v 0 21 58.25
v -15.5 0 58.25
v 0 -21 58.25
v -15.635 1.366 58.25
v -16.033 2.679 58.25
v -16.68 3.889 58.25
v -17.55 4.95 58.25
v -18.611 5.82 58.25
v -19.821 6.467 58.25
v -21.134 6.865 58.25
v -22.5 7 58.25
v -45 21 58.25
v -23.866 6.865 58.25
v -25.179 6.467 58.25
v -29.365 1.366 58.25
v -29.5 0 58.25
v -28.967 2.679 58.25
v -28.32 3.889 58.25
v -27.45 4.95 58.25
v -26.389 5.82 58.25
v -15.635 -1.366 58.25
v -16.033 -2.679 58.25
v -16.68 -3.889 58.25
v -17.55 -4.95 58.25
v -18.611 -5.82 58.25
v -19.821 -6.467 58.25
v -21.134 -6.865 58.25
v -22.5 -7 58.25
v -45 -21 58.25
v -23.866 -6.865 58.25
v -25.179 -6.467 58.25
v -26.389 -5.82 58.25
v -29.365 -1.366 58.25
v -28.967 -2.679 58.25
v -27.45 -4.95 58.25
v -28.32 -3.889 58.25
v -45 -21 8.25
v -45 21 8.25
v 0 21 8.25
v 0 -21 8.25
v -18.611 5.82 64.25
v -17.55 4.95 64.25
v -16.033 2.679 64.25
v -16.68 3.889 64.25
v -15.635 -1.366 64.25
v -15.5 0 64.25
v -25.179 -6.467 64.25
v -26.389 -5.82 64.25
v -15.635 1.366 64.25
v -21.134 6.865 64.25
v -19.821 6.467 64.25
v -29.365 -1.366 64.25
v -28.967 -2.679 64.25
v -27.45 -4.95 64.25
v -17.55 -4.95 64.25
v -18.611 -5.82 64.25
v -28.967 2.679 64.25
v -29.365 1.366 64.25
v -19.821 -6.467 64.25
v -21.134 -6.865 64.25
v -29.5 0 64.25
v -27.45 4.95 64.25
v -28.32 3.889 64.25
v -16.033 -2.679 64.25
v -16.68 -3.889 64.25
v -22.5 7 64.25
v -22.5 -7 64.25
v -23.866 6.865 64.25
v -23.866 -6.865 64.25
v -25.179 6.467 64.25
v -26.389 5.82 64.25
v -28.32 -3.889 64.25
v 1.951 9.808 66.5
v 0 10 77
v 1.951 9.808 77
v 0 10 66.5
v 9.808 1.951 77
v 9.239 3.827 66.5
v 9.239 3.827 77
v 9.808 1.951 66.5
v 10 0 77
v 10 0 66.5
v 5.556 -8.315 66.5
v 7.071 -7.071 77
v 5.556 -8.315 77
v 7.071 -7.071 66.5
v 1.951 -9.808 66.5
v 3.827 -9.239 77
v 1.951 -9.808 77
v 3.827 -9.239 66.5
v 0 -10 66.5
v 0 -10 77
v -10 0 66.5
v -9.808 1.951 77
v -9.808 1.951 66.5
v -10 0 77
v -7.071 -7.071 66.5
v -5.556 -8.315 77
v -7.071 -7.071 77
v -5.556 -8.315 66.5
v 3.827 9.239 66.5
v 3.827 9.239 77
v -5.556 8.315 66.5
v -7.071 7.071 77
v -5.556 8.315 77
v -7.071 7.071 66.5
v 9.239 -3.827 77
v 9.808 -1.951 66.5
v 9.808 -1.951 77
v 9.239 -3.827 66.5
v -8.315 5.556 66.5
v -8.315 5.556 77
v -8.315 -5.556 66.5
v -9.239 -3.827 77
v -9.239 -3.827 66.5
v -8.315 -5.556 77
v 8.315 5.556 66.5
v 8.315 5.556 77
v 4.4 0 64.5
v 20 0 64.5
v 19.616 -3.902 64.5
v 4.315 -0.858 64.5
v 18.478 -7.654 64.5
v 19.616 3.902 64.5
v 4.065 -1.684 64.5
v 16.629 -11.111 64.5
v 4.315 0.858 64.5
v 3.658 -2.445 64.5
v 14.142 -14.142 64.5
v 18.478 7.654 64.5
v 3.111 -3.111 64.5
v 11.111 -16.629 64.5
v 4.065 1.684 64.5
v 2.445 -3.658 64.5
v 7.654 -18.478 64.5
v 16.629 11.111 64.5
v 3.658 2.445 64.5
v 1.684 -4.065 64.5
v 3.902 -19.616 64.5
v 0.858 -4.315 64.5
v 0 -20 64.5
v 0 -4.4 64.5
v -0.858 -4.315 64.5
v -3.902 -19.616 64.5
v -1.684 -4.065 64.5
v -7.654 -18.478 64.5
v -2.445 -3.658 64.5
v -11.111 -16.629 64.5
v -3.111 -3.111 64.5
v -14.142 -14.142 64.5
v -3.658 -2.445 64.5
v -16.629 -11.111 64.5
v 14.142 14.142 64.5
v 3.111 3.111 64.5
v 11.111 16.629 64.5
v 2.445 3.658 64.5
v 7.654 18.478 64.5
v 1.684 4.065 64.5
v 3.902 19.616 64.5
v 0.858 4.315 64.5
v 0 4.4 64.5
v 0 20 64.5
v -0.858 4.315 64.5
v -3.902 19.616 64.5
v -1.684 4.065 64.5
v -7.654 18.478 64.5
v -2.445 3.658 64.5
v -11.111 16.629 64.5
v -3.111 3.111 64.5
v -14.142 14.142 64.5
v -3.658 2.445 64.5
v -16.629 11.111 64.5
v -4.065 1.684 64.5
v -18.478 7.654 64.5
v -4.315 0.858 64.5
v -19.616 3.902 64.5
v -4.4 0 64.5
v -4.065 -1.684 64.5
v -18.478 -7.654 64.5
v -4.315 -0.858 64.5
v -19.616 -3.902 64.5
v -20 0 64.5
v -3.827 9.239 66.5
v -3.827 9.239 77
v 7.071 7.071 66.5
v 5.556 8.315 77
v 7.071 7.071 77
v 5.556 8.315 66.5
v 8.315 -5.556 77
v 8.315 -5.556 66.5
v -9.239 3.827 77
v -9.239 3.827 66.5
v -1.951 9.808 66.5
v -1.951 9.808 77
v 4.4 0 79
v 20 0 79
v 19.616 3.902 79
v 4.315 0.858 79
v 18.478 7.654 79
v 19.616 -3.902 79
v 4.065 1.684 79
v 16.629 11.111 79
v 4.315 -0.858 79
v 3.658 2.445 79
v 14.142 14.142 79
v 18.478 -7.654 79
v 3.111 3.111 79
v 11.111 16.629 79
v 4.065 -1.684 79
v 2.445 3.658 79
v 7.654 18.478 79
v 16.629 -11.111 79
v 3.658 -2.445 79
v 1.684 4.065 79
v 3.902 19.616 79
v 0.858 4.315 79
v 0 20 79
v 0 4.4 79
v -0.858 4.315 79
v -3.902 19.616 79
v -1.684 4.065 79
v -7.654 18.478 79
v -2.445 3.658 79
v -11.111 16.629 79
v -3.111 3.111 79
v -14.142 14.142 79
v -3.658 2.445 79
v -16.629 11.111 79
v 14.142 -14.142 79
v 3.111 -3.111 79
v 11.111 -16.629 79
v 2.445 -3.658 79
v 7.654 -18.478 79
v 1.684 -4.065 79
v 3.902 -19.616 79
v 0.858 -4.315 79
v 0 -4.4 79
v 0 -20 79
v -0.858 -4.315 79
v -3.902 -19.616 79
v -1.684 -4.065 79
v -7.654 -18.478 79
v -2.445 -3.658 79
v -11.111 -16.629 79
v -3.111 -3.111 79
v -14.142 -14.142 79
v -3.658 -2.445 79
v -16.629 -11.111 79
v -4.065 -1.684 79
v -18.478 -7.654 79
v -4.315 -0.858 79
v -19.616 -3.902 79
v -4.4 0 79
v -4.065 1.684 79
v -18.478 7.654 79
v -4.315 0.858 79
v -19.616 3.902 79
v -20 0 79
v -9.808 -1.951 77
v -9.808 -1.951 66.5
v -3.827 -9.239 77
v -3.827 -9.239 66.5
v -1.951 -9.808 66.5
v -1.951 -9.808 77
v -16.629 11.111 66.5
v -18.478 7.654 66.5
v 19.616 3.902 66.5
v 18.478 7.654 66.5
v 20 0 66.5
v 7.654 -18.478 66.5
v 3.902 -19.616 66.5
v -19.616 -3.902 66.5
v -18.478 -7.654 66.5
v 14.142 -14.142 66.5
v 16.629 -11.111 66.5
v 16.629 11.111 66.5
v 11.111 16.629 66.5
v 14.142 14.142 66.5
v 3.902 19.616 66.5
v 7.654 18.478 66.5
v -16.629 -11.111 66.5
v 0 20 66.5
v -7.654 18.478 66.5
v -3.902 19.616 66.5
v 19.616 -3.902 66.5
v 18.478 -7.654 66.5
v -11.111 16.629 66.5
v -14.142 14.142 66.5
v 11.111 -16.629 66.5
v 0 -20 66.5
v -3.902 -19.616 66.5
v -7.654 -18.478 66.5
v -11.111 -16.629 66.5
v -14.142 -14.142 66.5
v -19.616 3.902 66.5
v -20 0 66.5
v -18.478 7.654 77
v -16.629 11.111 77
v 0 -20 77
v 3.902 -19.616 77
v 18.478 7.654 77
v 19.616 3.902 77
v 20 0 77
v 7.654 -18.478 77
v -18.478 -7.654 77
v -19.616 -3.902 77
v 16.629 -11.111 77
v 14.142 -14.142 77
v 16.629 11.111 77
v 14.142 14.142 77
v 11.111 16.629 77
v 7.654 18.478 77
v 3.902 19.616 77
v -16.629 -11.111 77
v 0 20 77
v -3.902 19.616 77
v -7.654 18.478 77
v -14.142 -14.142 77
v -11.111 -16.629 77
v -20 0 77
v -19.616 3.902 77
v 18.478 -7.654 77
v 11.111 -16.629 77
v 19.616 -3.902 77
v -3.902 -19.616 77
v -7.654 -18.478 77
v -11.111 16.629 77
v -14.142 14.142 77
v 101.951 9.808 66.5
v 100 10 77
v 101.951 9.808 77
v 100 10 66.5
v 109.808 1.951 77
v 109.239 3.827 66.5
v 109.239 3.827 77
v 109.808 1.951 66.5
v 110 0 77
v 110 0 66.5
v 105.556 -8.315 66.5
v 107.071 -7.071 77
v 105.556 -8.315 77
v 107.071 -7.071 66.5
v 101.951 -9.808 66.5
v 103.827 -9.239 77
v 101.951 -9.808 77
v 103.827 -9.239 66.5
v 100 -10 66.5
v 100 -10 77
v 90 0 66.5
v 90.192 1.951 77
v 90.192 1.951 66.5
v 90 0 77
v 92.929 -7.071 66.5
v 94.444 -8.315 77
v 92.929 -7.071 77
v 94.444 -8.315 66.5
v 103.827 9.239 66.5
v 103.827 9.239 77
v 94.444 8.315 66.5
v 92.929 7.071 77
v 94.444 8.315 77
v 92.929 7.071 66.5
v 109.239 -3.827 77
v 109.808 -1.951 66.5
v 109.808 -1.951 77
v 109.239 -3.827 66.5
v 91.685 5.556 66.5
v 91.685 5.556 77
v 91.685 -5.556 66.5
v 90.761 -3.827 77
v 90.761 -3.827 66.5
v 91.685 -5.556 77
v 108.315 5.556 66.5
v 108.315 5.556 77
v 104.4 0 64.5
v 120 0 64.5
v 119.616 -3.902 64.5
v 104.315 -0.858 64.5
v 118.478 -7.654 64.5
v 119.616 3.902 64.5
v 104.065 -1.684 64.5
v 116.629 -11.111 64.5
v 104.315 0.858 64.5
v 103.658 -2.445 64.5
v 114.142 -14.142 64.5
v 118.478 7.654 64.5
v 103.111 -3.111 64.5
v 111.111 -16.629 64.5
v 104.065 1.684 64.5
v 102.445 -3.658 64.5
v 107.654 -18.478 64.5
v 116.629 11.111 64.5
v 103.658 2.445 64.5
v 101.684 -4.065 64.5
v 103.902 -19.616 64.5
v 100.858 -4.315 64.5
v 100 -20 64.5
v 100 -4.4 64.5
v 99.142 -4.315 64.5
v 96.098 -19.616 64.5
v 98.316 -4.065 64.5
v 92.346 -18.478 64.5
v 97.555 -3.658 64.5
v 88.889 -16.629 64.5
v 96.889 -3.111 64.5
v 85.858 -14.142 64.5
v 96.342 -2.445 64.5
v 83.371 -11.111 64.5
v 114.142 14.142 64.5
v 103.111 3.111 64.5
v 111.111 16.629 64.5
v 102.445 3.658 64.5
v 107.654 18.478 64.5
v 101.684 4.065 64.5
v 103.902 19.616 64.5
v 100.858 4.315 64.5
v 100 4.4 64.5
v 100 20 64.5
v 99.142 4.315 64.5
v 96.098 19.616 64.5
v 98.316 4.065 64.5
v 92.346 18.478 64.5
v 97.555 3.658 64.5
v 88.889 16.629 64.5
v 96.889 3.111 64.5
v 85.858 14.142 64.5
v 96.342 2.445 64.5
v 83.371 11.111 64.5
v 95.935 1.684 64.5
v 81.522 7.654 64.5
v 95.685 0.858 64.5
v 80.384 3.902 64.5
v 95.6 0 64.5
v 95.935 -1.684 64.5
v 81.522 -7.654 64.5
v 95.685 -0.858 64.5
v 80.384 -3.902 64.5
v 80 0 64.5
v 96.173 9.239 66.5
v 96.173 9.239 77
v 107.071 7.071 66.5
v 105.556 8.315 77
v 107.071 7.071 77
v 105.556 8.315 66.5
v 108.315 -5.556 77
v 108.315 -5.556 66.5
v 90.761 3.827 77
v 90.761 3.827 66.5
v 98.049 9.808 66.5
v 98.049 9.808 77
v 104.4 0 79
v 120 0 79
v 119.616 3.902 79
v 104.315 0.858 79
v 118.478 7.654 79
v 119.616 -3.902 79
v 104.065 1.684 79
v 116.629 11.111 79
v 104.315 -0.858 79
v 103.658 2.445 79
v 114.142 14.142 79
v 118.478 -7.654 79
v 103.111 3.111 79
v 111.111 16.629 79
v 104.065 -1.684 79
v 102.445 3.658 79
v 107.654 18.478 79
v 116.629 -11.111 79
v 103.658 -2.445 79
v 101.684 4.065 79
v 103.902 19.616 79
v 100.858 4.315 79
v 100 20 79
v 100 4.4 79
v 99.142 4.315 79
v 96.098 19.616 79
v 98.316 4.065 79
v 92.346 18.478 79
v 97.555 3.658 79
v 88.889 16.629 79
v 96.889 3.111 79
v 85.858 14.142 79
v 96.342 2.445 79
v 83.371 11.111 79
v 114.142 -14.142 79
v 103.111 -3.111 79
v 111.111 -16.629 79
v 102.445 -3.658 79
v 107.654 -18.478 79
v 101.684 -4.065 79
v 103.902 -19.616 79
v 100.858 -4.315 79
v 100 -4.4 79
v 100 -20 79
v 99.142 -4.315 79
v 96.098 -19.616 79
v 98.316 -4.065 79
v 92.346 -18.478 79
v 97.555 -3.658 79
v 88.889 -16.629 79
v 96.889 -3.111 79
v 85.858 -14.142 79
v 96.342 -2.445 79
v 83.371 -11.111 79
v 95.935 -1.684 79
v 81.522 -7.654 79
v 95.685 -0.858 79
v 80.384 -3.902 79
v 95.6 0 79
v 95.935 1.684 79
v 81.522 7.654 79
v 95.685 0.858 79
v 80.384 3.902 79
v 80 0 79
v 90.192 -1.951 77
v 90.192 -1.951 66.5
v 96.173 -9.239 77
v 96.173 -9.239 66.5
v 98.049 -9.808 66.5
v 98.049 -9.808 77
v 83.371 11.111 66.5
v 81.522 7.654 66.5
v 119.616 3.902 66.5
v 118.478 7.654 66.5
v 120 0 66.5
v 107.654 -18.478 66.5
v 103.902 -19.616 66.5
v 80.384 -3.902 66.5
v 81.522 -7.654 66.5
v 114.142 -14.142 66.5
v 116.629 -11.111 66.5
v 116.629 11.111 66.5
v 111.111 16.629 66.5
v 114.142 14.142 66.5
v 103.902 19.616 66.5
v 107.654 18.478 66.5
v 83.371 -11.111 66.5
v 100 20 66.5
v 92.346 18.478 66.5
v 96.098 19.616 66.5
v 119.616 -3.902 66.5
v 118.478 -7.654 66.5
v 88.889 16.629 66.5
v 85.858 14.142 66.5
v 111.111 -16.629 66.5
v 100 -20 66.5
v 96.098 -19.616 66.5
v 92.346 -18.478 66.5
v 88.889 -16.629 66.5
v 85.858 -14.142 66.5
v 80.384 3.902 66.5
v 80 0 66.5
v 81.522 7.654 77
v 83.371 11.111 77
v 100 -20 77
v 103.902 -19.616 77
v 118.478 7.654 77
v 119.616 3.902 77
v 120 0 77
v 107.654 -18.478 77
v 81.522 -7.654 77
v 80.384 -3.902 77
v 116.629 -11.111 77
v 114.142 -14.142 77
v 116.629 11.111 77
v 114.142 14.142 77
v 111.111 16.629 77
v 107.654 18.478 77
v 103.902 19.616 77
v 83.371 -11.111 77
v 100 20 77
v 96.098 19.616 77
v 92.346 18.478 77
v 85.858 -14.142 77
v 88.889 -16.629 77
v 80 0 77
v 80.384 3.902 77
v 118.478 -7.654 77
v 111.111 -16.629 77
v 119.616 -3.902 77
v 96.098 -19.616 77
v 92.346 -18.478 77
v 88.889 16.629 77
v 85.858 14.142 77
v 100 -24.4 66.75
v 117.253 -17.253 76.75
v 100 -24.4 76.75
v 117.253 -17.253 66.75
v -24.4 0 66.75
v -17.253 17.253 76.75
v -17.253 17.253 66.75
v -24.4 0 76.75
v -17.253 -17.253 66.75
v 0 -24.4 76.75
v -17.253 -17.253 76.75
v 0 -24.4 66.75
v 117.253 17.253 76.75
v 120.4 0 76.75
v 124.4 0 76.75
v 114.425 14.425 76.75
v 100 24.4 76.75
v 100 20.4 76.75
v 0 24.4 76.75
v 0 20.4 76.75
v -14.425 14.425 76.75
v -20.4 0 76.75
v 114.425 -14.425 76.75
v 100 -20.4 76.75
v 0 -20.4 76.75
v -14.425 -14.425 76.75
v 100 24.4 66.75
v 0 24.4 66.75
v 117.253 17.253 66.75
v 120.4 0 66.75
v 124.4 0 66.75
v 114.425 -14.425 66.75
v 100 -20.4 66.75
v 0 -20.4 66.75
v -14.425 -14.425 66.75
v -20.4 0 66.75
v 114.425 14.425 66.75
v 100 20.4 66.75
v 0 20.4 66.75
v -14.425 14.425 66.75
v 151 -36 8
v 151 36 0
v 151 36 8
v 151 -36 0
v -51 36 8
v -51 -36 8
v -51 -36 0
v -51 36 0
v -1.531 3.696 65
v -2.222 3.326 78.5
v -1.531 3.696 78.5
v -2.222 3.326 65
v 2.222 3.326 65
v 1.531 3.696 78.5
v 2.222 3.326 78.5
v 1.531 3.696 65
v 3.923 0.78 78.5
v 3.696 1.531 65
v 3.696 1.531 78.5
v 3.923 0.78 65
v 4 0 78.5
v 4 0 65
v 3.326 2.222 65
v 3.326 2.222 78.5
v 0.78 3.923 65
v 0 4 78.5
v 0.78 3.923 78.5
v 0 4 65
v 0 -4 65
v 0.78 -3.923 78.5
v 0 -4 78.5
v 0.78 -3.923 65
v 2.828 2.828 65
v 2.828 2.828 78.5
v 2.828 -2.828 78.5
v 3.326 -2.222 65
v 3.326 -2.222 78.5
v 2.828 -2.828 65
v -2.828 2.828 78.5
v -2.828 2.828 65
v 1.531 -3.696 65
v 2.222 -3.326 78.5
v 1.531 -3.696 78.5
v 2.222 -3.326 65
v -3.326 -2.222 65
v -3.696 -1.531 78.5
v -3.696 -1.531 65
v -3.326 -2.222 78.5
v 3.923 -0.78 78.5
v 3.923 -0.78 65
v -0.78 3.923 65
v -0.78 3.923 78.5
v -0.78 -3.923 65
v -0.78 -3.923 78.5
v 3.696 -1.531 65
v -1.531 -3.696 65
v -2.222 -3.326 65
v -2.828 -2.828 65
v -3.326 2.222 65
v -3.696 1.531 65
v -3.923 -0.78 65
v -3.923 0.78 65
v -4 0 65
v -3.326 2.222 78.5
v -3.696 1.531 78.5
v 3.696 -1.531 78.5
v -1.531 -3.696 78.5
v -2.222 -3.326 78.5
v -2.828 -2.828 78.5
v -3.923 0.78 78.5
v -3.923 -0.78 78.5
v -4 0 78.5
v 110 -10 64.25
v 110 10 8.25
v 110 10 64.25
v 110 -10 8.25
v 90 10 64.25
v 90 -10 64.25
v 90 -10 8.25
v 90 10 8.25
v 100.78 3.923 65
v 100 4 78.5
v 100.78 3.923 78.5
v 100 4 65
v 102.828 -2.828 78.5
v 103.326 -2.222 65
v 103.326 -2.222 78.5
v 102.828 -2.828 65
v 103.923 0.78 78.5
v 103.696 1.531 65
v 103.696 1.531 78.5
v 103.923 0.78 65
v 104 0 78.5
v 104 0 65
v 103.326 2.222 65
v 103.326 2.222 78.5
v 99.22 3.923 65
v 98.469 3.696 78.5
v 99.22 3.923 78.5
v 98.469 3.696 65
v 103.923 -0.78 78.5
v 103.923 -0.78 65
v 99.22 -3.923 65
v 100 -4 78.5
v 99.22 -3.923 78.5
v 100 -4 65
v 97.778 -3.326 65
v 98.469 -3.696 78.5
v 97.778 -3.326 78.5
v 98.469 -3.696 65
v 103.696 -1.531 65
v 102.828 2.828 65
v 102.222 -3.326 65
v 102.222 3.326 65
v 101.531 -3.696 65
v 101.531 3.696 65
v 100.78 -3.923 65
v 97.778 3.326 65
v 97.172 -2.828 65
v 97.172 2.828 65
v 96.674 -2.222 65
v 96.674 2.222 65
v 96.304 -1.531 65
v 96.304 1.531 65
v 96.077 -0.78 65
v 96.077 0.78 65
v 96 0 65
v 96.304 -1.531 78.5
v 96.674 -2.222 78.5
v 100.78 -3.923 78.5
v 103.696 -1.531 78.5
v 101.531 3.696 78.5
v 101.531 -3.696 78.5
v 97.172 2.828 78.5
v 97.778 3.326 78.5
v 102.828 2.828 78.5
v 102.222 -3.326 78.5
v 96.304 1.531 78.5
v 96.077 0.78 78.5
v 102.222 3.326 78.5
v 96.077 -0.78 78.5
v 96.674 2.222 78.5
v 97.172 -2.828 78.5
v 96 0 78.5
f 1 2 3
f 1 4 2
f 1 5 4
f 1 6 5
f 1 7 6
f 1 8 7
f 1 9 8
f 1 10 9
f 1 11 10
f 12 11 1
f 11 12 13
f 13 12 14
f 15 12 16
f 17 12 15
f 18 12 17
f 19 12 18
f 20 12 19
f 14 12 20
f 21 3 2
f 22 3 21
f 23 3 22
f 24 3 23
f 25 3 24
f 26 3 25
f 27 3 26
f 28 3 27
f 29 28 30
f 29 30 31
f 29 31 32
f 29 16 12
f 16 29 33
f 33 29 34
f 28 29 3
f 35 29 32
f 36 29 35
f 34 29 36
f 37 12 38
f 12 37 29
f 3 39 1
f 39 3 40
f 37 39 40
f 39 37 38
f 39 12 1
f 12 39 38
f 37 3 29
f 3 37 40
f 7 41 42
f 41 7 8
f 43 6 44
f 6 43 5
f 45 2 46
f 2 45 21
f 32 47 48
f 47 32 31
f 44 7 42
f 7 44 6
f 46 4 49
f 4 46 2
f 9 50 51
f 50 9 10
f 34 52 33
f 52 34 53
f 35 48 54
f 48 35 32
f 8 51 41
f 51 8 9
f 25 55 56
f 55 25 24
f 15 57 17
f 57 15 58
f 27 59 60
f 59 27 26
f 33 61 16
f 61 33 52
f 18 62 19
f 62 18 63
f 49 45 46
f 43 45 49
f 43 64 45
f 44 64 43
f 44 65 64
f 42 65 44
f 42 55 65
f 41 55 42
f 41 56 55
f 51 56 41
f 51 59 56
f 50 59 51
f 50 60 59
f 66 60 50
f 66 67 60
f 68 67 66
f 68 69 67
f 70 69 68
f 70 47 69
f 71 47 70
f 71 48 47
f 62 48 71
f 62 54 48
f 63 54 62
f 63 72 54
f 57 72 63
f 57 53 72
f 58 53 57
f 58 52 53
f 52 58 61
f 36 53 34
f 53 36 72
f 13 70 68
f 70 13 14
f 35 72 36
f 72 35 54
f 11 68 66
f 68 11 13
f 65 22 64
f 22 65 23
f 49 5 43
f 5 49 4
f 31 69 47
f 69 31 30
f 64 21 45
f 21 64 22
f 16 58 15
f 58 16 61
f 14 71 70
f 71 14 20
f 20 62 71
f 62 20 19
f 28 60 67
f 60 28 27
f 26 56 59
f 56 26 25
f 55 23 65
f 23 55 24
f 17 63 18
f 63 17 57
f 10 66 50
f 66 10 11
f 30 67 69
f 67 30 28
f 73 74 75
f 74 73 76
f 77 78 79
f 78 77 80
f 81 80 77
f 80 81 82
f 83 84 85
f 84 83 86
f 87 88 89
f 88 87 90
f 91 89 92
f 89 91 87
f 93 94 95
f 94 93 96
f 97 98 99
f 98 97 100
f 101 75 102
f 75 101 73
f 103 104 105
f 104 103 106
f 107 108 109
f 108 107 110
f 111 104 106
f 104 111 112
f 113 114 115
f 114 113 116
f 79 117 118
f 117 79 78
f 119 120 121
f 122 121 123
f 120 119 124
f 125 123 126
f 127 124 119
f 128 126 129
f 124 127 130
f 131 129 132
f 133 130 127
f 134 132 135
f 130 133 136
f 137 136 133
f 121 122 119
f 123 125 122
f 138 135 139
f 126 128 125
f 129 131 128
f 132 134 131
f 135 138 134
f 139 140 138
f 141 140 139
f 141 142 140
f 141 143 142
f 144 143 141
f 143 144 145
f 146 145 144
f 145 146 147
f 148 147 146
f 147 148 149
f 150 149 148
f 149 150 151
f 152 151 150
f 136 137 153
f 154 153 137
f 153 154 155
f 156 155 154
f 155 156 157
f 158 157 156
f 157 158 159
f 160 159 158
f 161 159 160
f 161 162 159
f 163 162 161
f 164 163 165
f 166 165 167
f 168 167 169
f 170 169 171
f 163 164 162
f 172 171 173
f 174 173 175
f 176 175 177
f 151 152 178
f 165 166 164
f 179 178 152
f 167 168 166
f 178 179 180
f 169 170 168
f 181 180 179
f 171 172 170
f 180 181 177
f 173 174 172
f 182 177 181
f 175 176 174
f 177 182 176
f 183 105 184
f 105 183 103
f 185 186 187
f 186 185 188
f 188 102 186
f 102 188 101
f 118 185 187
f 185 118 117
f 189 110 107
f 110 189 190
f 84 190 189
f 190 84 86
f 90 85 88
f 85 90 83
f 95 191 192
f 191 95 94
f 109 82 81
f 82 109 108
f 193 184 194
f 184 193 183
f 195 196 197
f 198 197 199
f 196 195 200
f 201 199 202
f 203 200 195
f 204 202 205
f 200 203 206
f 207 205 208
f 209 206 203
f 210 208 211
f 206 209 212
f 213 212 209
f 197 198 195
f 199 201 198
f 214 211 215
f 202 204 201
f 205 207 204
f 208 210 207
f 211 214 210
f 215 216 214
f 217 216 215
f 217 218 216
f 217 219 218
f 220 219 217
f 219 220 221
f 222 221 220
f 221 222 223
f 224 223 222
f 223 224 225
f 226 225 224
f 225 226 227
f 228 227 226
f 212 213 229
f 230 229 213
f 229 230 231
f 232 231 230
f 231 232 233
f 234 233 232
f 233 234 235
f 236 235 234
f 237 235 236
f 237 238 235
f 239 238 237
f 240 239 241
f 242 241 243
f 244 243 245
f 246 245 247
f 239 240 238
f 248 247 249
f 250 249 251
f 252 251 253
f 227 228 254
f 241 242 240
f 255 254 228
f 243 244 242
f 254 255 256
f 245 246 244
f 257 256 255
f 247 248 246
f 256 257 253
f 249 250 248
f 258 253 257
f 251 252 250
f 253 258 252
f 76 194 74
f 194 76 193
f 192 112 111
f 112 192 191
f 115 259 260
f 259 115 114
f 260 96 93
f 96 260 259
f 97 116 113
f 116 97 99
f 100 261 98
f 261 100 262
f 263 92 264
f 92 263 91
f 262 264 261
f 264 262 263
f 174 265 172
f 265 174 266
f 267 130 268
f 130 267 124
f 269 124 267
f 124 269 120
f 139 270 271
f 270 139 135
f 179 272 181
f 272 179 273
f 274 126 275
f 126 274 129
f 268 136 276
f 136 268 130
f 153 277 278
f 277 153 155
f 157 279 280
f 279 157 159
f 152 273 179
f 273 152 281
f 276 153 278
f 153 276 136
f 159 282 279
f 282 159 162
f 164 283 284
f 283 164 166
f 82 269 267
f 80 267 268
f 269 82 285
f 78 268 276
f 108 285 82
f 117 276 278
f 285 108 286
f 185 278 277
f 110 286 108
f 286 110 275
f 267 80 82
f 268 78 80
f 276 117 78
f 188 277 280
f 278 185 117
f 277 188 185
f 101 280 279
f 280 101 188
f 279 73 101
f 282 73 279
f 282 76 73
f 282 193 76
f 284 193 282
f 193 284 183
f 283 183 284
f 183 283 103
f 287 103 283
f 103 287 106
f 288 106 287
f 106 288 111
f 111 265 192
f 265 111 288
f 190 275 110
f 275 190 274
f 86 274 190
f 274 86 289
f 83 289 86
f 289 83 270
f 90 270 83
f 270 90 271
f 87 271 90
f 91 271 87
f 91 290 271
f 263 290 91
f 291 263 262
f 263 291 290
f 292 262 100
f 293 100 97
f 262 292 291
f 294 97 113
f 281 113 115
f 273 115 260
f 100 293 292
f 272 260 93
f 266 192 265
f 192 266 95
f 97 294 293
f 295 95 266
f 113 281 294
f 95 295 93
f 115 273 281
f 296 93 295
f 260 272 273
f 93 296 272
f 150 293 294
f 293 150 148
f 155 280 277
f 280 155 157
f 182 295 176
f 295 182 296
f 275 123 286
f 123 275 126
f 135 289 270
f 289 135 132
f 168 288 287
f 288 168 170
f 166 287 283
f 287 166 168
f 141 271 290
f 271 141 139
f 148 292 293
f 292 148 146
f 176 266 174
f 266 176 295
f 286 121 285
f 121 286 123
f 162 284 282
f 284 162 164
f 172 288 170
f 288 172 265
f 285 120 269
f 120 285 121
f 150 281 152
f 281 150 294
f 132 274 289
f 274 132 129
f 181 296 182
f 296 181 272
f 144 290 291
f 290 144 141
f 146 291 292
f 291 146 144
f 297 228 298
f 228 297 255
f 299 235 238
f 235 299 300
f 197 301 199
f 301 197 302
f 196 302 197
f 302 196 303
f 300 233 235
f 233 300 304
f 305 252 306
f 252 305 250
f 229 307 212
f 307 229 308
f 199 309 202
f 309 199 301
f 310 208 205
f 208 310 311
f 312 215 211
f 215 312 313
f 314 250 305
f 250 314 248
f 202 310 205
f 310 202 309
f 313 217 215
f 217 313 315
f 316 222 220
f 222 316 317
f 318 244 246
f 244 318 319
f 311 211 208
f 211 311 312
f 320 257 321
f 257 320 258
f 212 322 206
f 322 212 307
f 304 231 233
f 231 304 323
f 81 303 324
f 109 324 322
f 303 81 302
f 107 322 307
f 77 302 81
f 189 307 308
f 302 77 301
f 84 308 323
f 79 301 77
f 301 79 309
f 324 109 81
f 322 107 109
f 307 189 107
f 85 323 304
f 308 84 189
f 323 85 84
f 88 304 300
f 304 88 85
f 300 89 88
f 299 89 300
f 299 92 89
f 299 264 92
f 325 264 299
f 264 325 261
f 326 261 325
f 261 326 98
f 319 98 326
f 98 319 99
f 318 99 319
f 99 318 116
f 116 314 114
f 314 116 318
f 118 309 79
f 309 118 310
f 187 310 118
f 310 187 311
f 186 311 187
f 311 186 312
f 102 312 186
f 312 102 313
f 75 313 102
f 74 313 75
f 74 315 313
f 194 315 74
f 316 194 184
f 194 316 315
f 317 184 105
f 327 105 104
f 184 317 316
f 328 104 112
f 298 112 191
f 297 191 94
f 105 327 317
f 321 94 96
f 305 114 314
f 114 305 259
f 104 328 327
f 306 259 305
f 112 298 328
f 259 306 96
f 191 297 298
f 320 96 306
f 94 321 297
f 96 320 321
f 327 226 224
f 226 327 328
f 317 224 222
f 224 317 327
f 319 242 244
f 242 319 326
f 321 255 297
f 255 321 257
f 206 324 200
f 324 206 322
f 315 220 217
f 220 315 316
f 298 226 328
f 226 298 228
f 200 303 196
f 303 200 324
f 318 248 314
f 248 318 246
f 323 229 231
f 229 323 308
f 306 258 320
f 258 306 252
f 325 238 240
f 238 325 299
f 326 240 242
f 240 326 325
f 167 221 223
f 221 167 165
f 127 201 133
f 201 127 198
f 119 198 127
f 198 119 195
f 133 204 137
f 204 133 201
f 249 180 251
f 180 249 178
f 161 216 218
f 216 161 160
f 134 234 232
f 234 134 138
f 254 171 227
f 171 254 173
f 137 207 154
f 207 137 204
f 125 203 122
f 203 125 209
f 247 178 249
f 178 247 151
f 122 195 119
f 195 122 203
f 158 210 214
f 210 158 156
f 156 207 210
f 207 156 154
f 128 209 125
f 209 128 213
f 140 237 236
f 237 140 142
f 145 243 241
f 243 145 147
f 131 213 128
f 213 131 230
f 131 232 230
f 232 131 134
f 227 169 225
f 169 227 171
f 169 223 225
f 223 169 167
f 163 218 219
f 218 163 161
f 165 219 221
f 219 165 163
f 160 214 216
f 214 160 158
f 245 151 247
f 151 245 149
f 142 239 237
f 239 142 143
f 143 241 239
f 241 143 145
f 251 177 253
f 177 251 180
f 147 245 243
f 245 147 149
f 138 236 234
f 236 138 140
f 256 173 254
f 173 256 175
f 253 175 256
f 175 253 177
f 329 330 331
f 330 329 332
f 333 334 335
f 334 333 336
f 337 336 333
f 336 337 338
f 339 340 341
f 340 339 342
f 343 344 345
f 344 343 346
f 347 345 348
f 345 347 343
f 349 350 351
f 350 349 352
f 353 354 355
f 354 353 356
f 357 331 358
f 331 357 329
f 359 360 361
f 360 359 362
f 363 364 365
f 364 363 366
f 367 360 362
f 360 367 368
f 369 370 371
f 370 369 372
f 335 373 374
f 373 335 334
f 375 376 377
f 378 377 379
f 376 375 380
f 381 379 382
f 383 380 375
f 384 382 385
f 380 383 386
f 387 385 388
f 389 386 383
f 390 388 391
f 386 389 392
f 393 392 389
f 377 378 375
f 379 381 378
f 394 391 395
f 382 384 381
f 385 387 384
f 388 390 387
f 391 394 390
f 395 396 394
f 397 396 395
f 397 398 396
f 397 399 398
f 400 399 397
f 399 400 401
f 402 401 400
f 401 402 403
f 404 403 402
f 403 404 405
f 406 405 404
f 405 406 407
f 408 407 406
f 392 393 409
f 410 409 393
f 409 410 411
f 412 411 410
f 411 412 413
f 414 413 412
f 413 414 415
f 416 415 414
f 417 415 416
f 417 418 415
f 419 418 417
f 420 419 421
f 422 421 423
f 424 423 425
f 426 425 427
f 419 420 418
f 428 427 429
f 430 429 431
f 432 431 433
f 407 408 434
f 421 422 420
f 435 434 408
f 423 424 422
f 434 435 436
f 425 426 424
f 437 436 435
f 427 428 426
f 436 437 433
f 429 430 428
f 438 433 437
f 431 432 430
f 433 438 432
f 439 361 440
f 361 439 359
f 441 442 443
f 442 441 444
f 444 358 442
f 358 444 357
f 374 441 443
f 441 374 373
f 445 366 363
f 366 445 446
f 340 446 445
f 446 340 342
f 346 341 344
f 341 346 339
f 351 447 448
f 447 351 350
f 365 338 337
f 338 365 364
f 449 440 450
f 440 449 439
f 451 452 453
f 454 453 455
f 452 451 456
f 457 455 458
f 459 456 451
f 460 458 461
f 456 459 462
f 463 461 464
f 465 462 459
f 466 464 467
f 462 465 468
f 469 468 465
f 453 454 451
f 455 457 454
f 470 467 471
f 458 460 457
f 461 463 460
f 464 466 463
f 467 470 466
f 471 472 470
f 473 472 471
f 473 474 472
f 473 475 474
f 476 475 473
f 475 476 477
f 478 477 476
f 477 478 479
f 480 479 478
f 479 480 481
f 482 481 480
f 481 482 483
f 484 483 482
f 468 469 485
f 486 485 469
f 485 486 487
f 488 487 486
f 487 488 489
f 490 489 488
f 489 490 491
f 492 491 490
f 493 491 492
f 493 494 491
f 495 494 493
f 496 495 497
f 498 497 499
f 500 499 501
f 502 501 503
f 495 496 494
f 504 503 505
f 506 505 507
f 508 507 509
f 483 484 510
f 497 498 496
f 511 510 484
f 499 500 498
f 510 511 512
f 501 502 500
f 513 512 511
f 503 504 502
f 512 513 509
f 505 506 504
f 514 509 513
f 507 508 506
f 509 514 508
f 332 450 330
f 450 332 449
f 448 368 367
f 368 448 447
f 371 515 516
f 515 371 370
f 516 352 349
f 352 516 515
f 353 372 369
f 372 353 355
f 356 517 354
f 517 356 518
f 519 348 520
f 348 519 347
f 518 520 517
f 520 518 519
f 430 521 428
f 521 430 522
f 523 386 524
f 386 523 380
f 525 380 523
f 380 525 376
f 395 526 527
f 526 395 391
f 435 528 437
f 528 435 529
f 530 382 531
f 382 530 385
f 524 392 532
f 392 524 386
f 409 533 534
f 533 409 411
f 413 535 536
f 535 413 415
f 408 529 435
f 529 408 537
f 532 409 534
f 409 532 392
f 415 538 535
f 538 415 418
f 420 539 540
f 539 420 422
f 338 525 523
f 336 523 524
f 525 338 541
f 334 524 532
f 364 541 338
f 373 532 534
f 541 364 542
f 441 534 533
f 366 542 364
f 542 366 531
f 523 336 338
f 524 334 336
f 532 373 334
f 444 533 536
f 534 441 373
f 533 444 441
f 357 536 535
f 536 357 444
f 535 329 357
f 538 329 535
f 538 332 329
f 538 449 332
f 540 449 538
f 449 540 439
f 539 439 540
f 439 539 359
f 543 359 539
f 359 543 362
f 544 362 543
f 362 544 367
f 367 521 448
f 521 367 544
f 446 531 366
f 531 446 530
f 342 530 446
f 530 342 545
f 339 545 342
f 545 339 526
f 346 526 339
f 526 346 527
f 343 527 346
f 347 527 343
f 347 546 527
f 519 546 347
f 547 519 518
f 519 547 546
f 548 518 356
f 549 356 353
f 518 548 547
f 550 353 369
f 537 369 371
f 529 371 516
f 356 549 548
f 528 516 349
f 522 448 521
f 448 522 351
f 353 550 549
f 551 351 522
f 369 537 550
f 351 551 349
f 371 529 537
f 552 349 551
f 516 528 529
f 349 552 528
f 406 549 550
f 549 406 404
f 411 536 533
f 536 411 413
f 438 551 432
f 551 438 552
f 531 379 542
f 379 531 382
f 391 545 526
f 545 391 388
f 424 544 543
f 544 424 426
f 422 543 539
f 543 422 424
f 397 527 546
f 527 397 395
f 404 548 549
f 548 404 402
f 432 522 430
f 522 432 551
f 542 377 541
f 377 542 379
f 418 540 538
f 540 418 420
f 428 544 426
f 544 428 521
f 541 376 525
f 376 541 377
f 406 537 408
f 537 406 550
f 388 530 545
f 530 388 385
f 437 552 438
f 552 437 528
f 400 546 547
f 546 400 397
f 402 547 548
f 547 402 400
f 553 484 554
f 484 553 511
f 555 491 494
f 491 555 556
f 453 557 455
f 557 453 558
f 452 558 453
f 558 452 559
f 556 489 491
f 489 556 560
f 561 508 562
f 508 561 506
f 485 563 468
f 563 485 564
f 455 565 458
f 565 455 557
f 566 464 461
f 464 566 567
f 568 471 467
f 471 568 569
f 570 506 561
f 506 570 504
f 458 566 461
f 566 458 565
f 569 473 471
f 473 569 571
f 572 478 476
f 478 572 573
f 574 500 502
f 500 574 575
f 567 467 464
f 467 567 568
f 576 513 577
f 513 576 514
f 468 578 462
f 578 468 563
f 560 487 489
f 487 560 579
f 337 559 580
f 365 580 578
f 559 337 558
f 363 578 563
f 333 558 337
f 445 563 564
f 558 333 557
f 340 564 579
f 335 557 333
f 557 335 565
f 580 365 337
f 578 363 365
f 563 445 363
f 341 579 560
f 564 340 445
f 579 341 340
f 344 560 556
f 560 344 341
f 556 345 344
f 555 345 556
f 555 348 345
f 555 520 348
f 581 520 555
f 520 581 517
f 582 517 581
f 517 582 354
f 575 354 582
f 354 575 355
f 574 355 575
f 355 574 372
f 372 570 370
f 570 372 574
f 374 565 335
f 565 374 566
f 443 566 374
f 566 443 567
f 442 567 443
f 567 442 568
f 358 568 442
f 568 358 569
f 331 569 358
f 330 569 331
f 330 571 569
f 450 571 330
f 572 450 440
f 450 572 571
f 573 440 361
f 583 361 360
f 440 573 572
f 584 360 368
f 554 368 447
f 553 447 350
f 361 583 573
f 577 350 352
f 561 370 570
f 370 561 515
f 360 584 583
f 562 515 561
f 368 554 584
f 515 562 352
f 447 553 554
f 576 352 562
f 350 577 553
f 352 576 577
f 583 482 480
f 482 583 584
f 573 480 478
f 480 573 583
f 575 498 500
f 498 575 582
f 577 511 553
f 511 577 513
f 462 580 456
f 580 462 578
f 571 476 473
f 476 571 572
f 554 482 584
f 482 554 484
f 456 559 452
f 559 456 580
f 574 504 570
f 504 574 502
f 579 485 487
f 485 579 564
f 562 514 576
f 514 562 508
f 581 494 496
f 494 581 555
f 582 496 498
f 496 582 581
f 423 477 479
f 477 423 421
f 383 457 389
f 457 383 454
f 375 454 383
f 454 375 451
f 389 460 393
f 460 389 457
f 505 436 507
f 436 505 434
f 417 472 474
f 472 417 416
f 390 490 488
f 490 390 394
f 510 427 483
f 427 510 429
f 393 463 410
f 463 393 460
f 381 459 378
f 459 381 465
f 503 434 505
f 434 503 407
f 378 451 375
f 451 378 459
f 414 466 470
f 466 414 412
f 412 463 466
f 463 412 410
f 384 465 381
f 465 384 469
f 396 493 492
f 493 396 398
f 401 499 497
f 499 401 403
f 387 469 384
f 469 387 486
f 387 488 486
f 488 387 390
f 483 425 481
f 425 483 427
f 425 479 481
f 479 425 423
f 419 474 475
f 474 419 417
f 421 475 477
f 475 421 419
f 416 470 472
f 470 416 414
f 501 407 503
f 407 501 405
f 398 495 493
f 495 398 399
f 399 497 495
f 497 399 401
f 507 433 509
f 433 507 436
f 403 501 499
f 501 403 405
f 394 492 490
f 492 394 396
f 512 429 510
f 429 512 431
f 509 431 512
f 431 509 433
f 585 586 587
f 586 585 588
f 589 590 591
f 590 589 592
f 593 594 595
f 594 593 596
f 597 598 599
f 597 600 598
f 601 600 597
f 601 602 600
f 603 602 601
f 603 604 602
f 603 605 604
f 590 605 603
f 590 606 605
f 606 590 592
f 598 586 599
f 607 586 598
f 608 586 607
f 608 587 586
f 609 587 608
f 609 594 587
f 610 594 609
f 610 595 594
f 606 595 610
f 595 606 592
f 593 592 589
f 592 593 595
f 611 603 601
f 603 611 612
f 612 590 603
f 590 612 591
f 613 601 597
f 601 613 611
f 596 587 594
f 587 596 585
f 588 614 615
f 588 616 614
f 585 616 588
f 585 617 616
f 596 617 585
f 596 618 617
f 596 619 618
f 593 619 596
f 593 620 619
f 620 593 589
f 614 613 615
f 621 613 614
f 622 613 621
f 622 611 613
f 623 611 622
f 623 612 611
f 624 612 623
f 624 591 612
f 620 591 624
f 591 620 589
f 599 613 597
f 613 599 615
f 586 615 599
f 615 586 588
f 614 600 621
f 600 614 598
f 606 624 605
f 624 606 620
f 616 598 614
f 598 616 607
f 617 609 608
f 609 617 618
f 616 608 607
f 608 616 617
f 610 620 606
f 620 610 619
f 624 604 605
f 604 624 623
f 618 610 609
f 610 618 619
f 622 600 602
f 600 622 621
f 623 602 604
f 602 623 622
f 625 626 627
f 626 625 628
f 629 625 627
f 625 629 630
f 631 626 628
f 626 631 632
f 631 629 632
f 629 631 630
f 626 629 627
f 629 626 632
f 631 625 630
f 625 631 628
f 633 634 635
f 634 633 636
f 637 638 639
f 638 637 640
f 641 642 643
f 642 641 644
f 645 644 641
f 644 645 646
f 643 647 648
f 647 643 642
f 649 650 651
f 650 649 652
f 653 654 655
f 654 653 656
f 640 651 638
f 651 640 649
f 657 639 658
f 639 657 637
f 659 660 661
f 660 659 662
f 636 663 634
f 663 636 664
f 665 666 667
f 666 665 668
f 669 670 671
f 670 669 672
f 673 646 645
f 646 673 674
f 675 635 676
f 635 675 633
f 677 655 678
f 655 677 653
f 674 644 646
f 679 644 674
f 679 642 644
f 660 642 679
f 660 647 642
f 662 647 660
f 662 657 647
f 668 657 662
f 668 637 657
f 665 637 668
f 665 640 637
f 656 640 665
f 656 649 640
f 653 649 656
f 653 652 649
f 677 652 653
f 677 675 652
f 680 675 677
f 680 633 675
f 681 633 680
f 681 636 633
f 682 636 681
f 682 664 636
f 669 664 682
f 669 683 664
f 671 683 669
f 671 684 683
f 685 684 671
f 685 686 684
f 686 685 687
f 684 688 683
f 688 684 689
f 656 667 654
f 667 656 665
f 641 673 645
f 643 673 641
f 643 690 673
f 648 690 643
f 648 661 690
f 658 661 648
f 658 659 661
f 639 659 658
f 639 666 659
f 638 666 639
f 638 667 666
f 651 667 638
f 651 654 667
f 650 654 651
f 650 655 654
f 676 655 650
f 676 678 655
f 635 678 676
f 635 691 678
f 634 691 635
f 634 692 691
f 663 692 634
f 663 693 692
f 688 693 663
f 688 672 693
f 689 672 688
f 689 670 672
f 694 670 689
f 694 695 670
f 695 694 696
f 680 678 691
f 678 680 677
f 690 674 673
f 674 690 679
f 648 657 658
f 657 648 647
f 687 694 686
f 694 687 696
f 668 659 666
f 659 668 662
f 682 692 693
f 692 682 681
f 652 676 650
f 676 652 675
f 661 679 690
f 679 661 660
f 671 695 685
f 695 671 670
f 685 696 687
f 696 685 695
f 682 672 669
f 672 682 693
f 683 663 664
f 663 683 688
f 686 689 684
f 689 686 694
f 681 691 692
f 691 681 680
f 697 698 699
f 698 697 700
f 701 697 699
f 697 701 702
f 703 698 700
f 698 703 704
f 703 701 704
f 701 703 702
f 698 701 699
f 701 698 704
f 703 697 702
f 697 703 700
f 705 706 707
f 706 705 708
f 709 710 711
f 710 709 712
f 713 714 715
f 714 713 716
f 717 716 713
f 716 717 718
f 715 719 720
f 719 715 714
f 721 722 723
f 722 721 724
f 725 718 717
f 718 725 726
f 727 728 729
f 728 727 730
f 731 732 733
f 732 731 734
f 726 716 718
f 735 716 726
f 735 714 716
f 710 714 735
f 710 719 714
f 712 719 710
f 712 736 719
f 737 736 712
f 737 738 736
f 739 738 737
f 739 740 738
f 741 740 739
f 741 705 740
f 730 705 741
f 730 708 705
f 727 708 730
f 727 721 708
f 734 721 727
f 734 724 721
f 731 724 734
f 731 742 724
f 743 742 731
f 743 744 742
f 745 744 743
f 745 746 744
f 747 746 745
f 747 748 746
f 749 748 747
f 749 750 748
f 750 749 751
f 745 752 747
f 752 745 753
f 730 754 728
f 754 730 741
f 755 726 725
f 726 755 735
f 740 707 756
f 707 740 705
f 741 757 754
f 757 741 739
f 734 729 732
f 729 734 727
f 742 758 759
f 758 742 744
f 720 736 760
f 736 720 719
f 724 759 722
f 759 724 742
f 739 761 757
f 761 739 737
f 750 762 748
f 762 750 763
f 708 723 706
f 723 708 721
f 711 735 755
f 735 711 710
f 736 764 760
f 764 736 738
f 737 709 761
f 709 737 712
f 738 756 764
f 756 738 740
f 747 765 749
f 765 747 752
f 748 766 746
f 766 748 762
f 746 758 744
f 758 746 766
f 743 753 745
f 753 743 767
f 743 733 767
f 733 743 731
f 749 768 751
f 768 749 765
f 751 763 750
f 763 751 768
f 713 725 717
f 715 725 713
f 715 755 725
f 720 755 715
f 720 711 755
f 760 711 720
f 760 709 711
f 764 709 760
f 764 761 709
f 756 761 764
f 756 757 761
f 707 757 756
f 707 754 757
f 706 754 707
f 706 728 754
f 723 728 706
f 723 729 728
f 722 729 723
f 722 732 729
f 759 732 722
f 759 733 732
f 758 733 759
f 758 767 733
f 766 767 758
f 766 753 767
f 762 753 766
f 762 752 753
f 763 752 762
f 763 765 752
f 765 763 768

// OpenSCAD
$fn = 32;

// ------------------------------------------------------------------------
// Motor belt drive: span 100 mm, pulleys d40, belt 10 mm wide
// Every part is its own module, assembly() places every instance.
// ------------------------------------------------------------------------

// --- part 1 ---
module base_plate() {
  difference() {
    translate([-101, -36, 0]) cube([202, 72, 8]);
  }
}

// --- part 2 ---
module motor() {
  union() {
    translate([-25, -21, 0]) cube([50, 42, 45]);
    translate([28, 0, 22.5]) rotate([0, 90, 0]) cylinder(h = 6, d = 14, center = true);
  }
}

// --- part 3 ---
module drive_shaft() {
  translate([0, 0, -6.75]) cylinder(h = 13.5, d = 8);
}

// --- part 4 ---
module pulley_drive() {
  difference() {
    union() {
      cylinder(h = 14.5, d = 20);
      cylinder(h = 2, d = 40);
      translate([0, 0, 12.5]) cylinder(h = 2, d = 40);
    }
    translate([0, 0, -1]) cylinder(h = 16.5, d = 8.8);
  }
}

// --- part 5 ---
module idler_post() {
  translate([-10, -10, 0]) cube([20, 20, 56]);
}

// --- part 6 ---
module driven_shaft() {
  translate([0, 0, -6.75]) cylinder(h = 13.5, d = 8);
}

// --- part 7 ---
module pulley_driven() {
  difference() {
    union() {
      cylinder(h = 14.5, d = 20);
      cylinder(h = 2, d = 40);
      translate([0, 0, 12.5]) cylinder(h = 2, d = 40);
    }
    translate([0, 0, -1]) cylinder(h = 16.5, d = 8.8);
  }
}

// --- part 8 ---
module drive_belt() {
  difference() {
    linear_extrude(height = 10) polygon(points = concat([for (a = [90 : 45 : 270]) [24.4 * cos(a), 24.4 * sin(a)]], [for (a = [270 : 45 : 450]) [100 + 24.4 * cos(a), 24.4 * sin(a)]]));
    translate([0, 0, -1]) linear_extrude(height = 12) polygon(points = concat([for (a = [90 : 45 : 270]) [20.4 * cos(a), 20.4 * sin(a)]], [for (a = [270 : 45 : 450]) [100 + 20.4 * cos(a), 20.4 * sin(a)]]));
  }
}

// --- assembly ---
module assembly() {
  color([0.80, 0.24, 0.20]) translate([50, 0, 0]) rotate([0, 0, 0]) base_plate();
  color([0.20, 0.45, 0.75]) translate([0, 0, 33.25]) rotate([0, 270, 0]) motor();
  color([0.25, 0.62, 0.32]) translate([0, 0, 71.75]) rotate([0, 0, 0]) drive_shaft();
  color([0.92, 0.70, 0.18]) translate([0, 0, 64.5]) rotate([0, 0, 0]) pulley_drive();
  color([0.58, 0.35, 0.70]) translate([100, 0, 8.25]) rotate([0, 0, 0]) idler_post();
  color([0.16, 0.66, 0.66]) translate([100, 0, 71.75]) rotate([0, 0, 0]) driven_shaft();
  color([0.85, 0.48, 0.18]) translate([100, 0, 64.5]) rotate([0, 0, 0]) pulley_driven();
  color([0.55, 0.60, 0.65]) translate([0, 0, 66.75]) rotate([0, 0, 0]) drive_belt();
}

assembly();
